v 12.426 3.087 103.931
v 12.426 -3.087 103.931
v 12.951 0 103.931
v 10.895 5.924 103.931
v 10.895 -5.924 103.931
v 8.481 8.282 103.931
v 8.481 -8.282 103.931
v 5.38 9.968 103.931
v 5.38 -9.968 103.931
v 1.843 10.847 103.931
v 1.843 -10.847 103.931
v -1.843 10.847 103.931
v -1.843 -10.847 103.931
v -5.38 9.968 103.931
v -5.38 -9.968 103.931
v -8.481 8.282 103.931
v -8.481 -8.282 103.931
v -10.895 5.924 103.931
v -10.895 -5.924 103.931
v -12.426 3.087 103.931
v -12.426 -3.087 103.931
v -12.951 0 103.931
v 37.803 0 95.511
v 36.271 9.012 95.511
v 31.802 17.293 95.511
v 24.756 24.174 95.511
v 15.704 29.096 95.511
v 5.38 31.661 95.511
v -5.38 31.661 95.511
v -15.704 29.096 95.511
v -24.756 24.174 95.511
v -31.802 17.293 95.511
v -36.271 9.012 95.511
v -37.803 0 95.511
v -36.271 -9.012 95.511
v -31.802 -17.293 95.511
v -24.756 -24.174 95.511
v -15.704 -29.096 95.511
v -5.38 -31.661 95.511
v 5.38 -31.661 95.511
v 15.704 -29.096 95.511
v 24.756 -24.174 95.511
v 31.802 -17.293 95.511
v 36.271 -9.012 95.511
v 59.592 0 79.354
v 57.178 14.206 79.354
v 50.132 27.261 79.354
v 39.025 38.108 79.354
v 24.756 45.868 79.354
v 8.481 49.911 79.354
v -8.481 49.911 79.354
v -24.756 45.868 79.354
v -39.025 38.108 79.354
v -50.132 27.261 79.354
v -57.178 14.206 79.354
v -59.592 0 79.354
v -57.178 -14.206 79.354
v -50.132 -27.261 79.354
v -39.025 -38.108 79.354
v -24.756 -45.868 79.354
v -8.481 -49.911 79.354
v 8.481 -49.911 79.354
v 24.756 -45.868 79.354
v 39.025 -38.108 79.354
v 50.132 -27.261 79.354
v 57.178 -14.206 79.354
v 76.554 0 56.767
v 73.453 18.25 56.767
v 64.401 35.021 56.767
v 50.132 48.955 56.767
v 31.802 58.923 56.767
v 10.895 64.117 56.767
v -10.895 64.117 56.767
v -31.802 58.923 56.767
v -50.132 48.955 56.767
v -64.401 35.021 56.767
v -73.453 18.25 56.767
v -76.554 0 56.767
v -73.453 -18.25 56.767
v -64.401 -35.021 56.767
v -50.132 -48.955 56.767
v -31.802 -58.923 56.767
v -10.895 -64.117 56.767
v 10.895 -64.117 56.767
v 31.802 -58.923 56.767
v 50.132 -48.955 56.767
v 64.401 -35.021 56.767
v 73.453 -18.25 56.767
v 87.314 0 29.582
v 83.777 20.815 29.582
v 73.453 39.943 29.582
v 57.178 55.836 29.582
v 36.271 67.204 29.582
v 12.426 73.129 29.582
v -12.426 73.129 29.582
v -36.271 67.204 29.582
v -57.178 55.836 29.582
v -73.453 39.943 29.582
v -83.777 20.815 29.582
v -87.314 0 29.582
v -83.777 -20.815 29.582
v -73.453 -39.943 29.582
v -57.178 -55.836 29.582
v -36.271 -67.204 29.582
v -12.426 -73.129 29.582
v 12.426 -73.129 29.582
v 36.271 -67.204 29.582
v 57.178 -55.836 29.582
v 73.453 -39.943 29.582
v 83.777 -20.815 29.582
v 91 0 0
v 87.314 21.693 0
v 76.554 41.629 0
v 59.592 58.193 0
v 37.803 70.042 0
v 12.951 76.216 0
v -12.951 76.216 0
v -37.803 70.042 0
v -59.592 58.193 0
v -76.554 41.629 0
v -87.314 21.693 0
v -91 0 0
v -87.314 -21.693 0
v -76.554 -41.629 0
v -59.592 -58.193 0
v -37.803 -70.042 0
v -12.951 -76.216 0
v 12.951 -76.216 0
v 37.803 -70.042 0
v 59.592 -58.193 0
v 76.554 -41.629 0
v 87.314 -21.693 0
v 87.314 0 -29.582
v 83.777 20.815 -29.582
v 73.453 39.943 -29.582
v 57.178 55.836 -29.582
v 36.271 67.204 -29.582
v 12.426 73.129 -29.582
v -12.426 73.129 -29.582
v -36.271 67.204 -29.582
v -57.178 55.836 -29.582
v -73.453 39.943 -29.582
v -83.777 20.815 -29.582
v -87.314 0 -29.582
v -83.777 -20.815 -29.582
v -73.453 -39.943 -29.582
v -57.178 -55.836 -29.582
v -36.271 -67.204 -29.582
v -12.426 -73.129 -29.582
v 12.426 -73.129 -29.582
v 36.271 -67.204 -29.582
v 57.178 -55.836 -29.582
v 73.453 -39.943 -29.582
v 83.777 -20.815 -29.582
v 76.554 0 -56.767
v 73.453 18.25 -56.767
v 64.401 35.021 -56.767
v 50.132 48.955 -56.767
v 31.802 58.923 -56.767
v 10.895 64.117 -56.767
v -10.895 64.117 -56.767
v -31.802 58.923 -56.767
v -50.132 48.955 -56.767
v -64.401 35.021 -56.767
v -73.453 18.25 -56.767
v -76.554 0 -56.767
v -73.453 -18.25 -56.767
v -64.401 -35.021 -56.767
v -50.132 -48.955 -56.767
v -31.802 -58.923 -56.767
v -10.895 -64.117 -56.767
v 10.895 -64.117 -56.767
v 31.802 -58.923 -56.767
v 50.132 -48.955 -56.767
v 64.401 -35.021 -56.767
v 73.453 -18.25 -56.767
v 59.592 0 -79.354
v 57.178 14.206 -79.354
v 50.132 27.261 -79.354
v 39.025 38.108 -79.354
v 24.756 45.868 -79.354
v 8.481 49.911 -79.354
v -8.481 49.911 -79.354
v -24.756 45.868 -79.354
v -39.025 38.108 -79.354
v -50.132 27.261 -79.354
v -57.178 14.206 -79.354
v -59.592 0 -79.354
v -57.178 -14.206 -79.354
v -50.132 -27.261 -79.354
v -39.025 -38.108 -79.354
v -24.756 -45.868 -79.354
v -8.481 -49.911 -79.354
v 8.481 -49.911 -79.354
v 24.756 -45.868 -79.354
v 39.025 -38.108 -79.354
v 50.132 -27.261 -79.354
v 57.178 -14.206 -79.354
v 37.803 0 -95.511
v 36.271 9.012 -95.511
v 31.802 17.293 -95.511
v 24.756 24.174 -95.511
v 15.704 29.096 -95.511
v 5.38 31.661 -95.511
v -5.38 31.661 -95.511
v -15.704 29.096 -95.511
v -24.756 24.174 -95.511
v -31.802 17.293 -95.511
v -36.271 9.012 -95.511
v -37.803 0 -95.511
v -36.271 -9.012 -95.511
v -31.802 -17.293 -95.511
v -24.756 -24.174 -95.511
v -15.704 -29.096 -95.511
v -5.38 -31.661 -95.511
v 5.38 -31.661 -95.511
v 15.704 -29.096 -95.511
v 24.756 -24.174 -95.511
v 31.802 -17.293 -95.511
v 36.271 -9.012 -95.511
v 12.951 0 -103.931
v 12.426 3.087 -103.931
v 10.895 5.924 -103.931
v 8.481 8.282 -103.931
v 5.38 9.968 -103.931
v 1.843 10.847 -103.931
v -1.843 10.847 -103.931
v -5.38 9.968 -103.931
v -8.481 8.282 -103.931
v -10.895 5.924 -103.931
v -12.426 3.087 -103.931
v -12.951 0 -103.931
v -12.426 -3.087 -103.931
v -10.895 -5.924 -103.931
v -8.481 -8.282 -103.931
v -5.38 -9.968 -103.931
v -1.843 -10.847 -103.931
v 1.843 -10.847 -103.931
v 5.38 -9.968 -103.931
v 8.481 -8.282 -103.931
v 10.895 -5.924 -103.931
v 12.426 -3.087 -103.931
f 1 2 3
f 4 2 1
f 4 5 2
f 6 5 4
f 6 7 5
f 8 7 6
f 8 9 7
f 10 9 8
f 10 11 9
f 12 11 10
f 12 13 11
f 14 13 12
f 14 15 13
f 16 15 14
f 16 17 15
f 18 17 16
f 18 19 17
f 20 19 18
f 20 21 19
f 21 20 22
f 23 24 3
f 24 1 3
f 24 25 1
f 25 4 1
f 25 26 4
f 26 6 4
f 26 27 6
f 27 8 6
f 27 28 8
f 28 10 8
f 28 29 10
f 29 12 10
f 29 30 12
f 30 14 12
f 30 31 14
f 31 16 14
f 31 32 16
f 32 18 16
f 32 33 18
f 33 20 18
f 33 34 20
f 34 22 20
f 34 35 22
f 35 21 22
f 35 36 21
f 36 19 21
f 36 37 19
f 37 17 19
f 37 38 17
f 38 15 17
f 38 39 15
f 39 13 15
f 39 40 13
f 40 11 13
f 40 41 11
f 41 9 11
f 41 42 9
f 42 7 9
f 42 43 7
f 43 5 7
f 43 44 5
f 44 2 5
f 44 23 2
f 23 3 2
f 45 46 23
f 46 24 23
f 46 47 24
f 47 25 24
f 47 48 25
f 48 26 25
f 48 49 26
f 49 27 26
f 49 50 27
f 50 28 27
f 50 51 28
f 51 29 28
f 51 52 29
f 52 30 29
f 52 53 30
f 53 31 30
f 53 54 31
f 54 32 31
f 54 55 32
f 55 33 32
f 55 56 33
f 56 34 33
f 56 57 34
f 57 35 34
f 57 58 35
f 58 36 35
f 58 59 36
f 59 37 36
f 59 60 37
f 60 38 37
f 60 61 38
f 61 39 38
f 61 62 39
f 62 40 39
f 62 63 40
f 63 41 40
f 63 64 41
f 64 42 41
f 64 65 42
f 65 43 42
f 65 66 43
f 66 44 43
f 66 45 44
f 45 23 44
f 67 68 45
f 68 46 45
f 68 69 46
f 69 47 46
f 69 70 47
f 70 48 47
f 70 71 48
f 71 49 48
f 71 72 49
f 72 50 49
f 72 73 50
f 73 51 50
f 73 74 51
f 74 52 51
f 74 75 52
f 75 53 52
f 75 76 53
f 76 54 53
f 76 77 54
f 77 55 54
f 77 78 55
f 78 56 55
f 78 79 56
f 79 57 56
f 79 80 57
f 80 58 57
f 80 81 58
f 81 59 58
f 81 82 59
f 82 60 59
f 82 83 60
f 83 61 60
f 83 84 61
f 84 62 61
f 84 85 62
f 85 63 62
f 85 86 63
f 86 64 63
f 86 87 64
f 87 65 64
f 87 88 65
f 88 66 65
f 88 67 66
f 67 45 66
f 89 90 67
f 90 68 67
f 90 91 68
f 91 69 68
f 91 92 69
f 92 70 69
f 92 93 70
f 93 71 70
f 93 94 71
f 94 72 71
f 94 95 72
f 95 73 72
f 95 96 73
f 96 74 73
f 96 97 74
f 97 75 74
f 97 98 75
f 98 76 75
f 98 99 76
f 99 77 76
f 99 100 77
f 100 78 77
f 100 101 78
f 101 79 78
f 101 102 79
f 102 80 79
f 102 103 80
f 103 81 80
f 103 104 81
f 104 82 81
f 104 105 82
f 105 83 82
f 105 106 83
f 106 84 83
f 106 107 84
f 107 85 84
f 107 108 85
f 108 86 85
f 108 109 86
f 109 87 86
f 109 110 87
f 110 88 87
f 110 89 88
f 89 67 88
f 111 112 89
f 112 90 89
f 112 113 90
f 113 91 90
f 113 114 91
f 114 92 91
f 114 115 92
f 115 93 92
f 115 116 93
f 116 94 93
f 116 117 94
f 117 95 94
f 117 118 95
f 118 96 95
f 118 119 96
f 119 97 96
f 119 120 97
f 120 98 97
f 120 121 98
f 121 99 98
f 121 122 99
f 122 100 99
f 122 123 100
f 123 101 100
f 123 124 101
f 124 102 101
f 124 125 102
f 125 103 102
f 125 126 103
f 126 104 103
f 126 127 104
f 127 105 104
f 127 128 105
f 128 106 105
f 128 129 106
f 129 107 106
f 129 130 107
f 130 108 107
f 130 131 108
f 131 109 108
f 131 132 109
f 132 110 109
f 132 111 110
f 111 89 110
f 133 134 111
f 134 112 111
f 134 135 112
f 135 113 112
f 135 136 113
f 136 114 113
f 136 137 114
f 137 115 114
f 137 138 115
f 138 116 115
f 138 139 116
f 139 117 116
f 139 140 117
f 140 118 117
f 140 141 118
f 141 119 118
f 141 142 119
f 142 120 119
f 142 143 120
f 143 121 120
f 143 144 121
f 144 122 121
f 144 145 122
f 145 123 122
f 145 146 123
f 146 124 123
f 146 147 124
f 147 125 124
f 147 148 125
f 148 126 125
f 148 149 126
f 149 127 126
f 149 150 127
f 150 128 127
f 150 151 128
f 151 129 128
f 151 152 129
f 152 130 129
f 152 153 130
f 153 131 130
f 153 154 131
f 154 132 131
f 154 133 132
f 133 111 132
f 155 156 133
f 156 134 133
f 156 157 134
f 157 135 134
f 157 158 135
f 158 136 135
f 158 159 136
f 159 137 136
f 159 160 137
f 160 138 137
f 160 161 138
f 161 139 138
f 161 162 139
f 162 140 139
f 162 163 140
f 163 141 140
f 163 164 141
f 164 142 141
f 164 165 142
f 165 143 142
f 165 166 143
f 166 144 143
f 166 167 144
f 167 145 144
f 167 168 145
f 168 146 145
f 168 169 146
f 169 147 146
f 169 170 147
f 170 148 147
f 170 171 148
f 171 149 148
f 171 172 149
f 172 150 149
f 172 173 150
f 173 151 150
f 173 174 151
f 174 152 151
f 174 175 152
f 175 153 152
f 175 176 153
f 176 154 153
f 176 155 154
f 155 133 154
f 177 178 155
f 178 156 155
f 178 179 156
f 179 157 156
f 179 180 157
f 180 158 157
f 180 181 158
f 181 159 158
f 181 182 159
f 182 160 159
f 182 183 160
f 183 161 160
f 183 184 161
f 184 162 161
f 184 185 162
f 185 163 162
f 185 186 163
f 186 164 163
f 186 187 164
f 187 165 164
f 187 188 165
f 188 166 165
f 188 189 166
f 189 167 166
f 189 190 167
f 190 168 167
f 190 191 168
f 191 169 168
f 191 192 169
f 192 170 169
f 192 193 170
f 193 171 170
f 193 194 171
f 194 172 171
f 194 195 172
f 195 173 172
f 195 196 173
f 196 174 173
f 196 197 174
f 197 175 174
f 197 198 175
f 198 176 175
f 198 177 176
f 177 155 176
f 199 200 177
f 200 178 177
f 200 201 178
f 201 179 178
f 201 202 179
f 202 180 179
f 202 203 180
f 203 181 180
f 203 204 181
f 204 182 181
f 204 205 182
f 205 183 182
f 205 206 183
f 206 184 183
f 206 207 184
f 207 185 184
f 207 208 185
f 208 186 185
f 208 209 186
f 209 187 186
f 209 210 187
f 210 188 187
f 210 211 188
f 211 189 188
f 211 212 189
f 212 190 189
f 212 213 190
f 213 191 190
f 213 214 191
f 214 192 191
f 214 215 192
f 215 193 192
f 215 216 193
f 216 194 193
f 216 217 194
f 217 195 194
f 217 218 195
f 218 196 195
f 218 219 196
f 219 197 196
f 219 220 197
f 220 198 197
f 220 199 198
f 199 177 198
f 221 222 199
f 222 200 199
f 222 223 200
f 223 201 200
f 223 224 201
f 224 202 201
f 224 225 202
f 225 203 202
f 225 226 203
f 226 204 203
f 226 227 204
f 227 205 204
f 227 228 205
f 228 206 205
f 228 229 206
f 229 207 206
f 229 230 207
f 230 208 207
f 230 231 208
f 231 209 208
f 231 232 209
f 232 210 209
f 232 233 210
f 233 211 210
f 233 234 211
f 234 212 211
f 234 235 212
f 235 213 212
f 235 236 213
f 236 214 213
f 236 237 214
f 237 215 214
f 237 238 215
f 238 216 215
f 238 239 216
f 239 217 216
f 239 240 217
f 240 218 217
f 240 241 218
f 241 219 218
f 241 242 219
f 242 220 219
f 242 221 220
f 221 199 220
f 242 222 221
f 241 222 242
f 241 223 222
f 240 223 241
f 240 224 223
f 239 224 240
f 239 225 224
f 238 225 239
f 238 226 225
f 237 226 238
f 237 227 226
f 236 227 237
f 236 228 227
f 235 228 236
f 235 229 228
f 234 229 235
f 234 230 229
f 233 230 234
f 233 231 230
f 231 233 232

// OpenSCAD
// Generated by SolidPython 1.0.1 on 2020-07-29 00:46:51


scale(v = [13, 11, 15]) {
	sphere(r = 7);
}
/***********************************************
*********      SolidPython code:      **********
************************************************
 
# import packages: SolidPython
from solid import *
from solid.utils import *
from itertools import chain, combinations, permutations


class Resize:

    def __init__(self, scad_file):
        self.scad_file = scad_file
        #self.scad_file = import_scad(scad_file)
        # cone/cylinder param:
        self.r1 = 0
        self.r2 = 0
        self.h = 0
        # rectangular prism param:
        self.w = 0
        self.l = 0
        # ellipse param:
        self.r = 0

    # import OpenScad code (file name corresponds to shape)


    # classify shape + parameters
    def assign(self, param1, param2, param3):
        if self.scad_file == 'cone.scad':
            self.r1 = param1
            self.r2 = param2
            self.h = param3
        elif self.scad_file == 'cylinder.scad':
            self.r1 = param1
            self.r2 = param2
            self.h = param3
        elif self.scad_file == 'rectangularPrism.scad':
            self.h = param1
            self.l = param2
            self.w = param3
        else:
            self.r = param1
            self.h = param2

    # resize parameters
    def iterate(self):
        x = range(3, 20, 2)
        i = 1
        if self.scad_file == 'cone.scad':
            tempList = list(permutations(x, 2))
            for temp in tempList:
                param1 = temp[0]
                param2 = temp[1]
                filepath = 'produced_scad_files/' + 'cone' + str(param1) + '_' + str(param2) + '_' + '.scad'
                scad_render_to_file(cylinder(h=param1, r1=param2, r2=0), filepath)

        elif self.scad_file == 'cylinder.scad':
            tempList = list(permutations(x, 3))
            for temp in tempList:
                param1 = temp[0]
                param2 = temp[1]
                filepath = 'produced_scad_files/' + 'cylinder' + str(param1) + '_' + str(param2) + '_' + '.scad'
                scad_render_to_file(cylinder(h=param1, r1=param2, r2=param2), filepath)

        elif self.scad_file == 'rectangularPrism.scad':
            tempList = list(permutations(x, 3))
            for temp in tempList:
                param1 = temp[0]
                param2 = temp[1]
                param3 = temp[2]
                filepath = 'produced_scad_files/' + 'rectangularPrism' + str(param1) + '_' + str(param2) + '_' + str(
                    param3) + '.scad'
                scad_render_to_file(cube(size=(param1, param2, param3)), filepath)

        elif self.scad_file == 'ellipse.scad':
            tempList = list(permutations(x, 4))
            for temp in tempList:
                param1 = temp[0]
                param2 = temp[1]
                param3 = temp[2]
                param4 = temp[3]
                filepath = 'produced_scad_files/' + 'ellipse' + str(param1) + '_' + str(param2) + '_' + str(param3) + '_' + str(param4) + '.scad'
                scad_render_to_file(scale([param1, param2, param3])(sphere(r=param4)), filepath)

    def render_to_scadfile(self):
        scad_render_to_file(scad, 'example.scad') 
 
************************************************/
